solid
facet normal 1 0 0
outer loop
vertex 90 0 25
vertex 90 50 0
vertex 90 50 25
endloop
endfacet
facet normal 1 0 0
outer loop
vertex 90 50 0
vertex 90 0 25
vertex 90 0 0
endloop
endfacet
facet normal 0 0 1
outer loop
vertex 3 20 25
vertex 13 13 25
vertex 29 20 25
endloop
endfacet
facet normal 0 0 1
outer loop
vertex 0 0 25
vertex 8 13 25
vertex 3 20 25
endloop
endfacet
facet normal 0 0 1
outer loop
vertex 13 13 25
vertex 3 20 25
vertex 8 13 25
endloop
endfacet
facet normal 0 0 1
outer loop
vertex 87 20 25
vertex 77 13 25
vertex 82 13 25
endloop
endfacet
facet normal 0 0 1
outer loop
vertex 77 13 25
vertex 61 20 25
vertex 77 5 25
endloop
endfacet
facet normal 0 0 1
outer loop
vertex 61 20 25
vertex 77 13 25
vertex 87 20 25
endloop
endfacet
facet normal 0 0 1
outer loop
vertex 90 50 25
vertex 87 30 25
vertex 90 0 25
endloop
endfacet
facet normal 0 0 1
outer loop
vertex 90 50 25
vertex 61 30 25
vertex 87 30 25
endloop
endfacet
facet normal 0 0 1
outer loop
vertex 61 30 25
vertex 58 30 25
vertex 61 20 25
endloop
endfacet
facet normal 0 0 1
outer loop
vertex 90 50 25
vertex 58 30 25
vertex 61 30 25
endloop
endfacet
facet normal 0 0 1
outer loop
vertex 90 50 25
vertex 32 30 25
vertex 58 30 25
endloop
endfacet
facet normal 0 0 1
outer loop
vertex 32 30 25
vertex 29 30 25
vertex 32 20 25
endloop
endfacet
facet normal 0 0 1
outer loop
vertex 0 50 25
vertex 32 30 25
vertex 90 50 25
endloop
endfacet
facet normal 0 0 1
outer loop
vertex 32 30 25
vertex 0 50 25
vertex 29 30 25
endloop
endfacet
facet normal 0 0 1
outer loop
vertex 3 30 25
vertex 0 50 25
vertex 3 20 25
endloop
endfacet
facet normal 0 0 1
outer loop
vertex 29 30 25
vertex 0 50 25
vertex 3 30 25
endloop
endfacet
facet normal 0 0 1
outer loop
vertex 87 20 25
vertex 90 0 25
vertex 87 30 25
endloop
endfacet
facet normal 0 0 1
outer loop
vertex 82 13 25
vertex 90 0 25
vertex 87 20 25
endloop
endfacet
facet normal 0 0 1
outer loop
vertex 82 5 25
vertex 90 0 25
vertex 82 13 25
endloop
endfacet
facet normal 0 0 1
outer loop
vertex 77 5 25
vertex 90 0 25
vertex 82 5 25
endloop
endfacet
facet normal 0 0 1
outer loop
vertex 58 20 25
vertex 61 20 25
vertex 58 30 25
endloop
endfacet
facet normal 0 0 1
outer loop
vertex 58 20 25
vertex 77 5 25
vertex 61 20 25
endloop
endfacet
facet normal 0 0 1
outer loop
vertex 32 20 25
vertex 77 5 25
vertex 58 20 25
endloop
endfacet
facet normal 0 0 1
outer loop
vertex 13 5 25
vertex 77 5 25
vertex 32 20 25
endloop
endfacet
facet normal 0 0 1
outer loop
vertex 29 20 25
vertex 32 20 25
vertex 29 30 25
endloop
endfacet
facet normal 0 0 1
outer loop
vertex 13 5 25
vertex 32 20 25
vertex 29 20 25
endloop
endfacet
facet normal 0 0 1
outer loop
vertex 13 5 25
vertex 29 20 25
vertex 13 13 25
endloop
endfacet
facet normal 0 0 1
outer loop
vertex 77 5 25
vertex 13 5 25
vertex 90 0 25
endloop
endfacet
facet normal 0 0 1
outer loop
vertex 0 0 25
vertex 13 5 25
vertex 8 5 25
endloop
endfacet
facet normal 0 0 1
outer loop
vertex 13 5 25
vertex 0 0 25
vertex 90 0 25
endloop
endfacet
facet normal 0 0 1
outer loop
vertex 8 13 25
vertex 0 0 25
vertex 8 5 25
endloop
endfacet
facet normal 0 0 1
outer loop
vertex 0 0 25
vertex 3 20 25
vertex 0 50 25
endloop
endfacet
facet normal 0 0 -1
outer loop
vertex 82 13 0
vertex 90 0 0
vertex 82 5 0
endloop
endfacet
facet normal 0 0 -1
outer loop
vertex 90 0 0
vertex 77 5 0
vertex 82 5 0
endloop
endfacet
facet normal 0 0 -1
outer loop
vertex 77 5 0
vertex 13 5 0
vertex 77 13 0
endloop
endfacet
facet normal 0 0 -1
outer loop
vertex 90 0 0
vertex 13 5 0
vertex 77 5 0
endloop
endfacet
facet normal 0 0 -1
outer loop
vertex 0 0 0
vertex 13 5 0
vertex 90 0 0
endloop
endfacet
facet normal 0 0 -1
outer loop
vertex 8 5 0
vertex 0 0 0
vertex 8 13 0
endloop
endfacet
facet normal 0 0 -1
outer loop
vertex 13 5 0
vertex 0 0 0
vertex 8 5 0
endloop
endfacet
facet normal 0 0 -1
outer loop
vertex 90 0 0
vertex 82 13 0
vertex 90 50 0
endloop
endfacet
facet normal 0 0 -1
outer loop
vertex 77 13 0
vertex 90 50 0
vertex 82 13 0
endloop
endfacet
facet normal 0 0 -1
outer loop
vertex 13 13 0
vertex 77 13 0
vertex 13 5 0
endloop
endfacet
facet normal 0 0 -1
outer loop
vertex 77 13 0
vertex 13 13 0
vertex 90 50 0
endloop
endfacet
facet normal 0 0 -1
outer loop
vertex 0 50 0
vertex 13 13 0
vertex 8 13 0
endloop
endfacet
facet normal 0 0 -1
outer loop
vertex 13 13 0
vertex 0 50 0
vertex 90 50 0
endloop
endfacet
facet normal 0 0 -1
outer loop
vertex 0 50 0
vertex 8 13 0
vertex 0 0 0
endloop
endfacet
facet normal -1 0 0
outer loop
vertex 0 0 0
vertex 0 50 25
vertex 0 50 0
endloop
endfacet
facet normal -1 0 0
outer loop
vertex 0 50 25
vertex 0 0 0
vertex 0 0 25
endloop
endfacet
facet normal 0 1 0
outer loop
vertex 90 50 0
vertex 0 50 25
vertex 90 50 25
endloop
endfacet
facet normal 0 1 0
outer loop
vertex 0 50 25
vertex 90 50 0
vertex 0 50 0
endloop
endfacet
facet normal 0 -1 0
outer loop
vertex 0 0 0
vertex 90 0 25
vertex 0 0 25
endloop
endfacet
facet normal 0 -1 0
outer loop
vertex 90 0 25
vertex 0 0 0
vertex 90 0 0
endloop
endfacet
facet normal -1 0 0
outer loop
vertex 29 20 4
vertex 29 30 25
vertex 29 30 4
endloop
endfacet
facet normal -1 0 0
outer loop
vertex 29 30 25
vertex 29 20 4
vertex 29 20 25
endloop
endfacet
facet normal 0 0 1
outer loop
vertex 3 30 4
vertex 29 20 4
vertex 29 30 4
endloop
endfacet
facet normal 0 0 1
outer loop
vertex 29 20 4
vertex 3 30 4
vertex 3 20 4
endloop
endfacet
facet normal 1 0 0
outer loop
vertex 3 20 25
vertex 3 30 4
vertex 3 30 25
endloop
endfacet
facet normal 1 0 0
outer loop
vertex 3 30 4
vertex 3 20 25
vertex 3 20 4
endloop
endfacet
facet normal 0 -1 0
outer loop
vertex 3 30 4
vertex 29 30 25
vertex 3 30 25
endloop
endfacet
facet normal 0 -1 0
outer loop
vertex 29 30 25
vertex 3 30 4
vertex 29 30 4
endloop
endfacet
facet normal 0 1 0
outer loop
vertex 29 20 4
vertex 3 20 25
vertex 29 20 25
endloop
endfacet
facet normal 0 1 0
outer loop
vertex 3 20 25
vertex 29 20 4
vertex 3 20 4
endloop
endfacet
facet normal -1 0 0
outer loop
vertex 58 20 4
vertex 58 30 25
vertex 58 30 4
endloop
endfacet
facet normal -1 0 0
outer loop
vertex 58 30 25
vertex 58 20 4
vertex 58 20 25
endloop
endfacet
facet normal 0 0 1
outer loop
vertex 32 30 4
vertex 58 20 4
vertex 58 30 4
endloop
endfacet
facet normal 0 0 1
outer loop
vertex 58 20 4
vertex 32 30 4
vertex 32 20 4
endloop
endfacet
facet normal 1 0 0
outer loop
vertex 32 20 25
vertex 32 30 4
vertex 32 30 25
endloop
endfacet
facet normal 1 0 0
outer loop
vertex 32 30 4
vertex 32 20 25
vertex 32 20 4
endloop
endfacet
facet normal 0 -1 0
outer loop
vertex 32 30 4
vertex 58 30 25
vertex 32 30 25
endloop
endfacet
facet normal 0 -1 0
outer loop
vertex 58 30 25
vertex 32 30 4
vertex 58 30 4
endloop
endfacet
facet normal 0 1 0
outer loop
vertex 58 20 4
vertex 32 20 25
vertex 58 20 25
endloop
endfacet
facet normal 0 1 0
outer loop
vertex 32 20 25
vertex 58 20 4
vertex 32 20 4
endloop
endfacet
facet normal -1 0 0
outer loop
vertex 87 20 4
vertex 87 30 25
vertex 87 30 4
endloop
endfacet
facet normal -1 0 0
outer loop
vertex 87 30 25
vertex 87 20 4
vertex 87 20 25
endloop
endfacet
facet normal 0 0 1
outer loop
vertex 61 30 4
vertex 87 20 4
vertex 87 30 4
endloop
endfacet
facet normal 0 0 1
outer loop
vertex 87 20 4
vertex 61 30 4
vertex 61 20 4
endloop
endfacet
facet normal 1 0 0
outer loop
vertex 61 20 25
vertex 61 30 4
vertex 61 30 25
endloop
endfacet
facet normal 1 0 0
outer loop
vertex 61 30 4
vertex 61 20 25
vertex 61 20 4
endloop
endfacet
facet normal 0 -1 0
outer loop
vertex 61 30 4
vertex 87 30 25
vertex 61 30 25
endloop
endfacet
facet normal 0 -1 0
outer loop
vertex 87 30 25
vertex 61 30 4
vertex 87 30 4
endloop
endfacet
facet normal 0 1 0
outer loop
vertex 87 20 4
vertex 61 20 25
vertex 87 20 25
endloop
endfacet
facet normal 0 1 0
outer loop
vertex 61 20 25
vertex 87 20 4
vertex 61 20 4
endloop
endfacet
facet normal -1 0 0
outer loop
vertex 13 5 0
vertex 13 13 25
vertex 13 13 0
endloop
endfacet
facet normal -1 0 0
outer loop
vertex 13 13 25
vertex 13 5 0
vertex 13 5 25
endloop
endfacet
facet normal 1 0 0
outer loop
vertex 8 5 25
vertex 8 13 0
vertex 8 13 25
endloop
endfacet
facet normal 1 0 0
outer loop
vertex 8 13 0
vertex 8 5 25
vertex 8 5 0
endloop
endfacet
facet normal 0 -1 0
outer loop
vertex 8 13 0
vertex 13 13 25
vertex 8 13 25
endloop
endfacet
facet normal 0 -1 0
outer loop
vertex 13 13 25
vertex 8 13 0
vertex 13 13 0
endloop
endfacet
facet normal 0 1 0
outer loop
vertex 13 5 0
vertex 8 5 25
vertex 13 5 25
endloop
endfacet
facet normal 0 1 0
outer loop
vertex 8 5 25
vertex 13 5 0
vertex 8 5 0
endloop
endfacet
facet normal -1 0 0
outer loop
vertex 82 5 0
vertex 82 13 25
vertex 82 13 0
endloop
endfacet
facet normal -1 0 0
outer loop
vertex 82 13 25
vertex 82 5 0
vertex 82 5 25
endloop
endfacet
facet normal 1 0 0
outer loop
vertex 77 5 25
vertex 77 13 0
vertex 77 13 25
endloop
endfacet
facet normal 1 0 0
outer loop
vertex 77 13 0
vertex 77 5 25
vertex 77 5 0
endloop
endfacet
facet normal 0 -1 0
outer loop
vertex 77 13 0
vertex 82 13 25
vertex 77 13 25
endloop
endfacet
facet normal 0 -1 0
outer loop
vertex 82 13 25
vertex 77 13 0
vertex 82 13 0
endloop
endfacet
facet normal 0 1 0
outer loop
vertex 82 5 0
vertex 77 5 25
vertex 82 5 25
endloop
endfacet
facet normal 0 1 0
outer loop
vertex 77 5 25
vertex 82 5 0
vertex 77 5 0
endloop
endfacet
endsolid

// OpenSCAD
// Original MechIntel educational model. CC0-1.0. Units: mm.
// Not a standardized or load-rated component.
$fn=96;
length=90;
width=50;
height=25;
floor=4;
pocket_width=26;
pocket_depth=10;
$fn=64;
difference(){union(){
translate([0,0,0]) cube([length,width,height]);
}
translate([3,20,floor]) cube([pocket_width,pocket_depth,height]);
translate([32,20,floor]) cube([pocket_width,pocket_depth,height]);
translate([61,20,floor]) cube([pocket_width,pocket_depth,height]);
translate([8,5,-1]) cube([5,8,height+2]);
translate([77,5,-1]) cube([5,8,height+2]);
}
